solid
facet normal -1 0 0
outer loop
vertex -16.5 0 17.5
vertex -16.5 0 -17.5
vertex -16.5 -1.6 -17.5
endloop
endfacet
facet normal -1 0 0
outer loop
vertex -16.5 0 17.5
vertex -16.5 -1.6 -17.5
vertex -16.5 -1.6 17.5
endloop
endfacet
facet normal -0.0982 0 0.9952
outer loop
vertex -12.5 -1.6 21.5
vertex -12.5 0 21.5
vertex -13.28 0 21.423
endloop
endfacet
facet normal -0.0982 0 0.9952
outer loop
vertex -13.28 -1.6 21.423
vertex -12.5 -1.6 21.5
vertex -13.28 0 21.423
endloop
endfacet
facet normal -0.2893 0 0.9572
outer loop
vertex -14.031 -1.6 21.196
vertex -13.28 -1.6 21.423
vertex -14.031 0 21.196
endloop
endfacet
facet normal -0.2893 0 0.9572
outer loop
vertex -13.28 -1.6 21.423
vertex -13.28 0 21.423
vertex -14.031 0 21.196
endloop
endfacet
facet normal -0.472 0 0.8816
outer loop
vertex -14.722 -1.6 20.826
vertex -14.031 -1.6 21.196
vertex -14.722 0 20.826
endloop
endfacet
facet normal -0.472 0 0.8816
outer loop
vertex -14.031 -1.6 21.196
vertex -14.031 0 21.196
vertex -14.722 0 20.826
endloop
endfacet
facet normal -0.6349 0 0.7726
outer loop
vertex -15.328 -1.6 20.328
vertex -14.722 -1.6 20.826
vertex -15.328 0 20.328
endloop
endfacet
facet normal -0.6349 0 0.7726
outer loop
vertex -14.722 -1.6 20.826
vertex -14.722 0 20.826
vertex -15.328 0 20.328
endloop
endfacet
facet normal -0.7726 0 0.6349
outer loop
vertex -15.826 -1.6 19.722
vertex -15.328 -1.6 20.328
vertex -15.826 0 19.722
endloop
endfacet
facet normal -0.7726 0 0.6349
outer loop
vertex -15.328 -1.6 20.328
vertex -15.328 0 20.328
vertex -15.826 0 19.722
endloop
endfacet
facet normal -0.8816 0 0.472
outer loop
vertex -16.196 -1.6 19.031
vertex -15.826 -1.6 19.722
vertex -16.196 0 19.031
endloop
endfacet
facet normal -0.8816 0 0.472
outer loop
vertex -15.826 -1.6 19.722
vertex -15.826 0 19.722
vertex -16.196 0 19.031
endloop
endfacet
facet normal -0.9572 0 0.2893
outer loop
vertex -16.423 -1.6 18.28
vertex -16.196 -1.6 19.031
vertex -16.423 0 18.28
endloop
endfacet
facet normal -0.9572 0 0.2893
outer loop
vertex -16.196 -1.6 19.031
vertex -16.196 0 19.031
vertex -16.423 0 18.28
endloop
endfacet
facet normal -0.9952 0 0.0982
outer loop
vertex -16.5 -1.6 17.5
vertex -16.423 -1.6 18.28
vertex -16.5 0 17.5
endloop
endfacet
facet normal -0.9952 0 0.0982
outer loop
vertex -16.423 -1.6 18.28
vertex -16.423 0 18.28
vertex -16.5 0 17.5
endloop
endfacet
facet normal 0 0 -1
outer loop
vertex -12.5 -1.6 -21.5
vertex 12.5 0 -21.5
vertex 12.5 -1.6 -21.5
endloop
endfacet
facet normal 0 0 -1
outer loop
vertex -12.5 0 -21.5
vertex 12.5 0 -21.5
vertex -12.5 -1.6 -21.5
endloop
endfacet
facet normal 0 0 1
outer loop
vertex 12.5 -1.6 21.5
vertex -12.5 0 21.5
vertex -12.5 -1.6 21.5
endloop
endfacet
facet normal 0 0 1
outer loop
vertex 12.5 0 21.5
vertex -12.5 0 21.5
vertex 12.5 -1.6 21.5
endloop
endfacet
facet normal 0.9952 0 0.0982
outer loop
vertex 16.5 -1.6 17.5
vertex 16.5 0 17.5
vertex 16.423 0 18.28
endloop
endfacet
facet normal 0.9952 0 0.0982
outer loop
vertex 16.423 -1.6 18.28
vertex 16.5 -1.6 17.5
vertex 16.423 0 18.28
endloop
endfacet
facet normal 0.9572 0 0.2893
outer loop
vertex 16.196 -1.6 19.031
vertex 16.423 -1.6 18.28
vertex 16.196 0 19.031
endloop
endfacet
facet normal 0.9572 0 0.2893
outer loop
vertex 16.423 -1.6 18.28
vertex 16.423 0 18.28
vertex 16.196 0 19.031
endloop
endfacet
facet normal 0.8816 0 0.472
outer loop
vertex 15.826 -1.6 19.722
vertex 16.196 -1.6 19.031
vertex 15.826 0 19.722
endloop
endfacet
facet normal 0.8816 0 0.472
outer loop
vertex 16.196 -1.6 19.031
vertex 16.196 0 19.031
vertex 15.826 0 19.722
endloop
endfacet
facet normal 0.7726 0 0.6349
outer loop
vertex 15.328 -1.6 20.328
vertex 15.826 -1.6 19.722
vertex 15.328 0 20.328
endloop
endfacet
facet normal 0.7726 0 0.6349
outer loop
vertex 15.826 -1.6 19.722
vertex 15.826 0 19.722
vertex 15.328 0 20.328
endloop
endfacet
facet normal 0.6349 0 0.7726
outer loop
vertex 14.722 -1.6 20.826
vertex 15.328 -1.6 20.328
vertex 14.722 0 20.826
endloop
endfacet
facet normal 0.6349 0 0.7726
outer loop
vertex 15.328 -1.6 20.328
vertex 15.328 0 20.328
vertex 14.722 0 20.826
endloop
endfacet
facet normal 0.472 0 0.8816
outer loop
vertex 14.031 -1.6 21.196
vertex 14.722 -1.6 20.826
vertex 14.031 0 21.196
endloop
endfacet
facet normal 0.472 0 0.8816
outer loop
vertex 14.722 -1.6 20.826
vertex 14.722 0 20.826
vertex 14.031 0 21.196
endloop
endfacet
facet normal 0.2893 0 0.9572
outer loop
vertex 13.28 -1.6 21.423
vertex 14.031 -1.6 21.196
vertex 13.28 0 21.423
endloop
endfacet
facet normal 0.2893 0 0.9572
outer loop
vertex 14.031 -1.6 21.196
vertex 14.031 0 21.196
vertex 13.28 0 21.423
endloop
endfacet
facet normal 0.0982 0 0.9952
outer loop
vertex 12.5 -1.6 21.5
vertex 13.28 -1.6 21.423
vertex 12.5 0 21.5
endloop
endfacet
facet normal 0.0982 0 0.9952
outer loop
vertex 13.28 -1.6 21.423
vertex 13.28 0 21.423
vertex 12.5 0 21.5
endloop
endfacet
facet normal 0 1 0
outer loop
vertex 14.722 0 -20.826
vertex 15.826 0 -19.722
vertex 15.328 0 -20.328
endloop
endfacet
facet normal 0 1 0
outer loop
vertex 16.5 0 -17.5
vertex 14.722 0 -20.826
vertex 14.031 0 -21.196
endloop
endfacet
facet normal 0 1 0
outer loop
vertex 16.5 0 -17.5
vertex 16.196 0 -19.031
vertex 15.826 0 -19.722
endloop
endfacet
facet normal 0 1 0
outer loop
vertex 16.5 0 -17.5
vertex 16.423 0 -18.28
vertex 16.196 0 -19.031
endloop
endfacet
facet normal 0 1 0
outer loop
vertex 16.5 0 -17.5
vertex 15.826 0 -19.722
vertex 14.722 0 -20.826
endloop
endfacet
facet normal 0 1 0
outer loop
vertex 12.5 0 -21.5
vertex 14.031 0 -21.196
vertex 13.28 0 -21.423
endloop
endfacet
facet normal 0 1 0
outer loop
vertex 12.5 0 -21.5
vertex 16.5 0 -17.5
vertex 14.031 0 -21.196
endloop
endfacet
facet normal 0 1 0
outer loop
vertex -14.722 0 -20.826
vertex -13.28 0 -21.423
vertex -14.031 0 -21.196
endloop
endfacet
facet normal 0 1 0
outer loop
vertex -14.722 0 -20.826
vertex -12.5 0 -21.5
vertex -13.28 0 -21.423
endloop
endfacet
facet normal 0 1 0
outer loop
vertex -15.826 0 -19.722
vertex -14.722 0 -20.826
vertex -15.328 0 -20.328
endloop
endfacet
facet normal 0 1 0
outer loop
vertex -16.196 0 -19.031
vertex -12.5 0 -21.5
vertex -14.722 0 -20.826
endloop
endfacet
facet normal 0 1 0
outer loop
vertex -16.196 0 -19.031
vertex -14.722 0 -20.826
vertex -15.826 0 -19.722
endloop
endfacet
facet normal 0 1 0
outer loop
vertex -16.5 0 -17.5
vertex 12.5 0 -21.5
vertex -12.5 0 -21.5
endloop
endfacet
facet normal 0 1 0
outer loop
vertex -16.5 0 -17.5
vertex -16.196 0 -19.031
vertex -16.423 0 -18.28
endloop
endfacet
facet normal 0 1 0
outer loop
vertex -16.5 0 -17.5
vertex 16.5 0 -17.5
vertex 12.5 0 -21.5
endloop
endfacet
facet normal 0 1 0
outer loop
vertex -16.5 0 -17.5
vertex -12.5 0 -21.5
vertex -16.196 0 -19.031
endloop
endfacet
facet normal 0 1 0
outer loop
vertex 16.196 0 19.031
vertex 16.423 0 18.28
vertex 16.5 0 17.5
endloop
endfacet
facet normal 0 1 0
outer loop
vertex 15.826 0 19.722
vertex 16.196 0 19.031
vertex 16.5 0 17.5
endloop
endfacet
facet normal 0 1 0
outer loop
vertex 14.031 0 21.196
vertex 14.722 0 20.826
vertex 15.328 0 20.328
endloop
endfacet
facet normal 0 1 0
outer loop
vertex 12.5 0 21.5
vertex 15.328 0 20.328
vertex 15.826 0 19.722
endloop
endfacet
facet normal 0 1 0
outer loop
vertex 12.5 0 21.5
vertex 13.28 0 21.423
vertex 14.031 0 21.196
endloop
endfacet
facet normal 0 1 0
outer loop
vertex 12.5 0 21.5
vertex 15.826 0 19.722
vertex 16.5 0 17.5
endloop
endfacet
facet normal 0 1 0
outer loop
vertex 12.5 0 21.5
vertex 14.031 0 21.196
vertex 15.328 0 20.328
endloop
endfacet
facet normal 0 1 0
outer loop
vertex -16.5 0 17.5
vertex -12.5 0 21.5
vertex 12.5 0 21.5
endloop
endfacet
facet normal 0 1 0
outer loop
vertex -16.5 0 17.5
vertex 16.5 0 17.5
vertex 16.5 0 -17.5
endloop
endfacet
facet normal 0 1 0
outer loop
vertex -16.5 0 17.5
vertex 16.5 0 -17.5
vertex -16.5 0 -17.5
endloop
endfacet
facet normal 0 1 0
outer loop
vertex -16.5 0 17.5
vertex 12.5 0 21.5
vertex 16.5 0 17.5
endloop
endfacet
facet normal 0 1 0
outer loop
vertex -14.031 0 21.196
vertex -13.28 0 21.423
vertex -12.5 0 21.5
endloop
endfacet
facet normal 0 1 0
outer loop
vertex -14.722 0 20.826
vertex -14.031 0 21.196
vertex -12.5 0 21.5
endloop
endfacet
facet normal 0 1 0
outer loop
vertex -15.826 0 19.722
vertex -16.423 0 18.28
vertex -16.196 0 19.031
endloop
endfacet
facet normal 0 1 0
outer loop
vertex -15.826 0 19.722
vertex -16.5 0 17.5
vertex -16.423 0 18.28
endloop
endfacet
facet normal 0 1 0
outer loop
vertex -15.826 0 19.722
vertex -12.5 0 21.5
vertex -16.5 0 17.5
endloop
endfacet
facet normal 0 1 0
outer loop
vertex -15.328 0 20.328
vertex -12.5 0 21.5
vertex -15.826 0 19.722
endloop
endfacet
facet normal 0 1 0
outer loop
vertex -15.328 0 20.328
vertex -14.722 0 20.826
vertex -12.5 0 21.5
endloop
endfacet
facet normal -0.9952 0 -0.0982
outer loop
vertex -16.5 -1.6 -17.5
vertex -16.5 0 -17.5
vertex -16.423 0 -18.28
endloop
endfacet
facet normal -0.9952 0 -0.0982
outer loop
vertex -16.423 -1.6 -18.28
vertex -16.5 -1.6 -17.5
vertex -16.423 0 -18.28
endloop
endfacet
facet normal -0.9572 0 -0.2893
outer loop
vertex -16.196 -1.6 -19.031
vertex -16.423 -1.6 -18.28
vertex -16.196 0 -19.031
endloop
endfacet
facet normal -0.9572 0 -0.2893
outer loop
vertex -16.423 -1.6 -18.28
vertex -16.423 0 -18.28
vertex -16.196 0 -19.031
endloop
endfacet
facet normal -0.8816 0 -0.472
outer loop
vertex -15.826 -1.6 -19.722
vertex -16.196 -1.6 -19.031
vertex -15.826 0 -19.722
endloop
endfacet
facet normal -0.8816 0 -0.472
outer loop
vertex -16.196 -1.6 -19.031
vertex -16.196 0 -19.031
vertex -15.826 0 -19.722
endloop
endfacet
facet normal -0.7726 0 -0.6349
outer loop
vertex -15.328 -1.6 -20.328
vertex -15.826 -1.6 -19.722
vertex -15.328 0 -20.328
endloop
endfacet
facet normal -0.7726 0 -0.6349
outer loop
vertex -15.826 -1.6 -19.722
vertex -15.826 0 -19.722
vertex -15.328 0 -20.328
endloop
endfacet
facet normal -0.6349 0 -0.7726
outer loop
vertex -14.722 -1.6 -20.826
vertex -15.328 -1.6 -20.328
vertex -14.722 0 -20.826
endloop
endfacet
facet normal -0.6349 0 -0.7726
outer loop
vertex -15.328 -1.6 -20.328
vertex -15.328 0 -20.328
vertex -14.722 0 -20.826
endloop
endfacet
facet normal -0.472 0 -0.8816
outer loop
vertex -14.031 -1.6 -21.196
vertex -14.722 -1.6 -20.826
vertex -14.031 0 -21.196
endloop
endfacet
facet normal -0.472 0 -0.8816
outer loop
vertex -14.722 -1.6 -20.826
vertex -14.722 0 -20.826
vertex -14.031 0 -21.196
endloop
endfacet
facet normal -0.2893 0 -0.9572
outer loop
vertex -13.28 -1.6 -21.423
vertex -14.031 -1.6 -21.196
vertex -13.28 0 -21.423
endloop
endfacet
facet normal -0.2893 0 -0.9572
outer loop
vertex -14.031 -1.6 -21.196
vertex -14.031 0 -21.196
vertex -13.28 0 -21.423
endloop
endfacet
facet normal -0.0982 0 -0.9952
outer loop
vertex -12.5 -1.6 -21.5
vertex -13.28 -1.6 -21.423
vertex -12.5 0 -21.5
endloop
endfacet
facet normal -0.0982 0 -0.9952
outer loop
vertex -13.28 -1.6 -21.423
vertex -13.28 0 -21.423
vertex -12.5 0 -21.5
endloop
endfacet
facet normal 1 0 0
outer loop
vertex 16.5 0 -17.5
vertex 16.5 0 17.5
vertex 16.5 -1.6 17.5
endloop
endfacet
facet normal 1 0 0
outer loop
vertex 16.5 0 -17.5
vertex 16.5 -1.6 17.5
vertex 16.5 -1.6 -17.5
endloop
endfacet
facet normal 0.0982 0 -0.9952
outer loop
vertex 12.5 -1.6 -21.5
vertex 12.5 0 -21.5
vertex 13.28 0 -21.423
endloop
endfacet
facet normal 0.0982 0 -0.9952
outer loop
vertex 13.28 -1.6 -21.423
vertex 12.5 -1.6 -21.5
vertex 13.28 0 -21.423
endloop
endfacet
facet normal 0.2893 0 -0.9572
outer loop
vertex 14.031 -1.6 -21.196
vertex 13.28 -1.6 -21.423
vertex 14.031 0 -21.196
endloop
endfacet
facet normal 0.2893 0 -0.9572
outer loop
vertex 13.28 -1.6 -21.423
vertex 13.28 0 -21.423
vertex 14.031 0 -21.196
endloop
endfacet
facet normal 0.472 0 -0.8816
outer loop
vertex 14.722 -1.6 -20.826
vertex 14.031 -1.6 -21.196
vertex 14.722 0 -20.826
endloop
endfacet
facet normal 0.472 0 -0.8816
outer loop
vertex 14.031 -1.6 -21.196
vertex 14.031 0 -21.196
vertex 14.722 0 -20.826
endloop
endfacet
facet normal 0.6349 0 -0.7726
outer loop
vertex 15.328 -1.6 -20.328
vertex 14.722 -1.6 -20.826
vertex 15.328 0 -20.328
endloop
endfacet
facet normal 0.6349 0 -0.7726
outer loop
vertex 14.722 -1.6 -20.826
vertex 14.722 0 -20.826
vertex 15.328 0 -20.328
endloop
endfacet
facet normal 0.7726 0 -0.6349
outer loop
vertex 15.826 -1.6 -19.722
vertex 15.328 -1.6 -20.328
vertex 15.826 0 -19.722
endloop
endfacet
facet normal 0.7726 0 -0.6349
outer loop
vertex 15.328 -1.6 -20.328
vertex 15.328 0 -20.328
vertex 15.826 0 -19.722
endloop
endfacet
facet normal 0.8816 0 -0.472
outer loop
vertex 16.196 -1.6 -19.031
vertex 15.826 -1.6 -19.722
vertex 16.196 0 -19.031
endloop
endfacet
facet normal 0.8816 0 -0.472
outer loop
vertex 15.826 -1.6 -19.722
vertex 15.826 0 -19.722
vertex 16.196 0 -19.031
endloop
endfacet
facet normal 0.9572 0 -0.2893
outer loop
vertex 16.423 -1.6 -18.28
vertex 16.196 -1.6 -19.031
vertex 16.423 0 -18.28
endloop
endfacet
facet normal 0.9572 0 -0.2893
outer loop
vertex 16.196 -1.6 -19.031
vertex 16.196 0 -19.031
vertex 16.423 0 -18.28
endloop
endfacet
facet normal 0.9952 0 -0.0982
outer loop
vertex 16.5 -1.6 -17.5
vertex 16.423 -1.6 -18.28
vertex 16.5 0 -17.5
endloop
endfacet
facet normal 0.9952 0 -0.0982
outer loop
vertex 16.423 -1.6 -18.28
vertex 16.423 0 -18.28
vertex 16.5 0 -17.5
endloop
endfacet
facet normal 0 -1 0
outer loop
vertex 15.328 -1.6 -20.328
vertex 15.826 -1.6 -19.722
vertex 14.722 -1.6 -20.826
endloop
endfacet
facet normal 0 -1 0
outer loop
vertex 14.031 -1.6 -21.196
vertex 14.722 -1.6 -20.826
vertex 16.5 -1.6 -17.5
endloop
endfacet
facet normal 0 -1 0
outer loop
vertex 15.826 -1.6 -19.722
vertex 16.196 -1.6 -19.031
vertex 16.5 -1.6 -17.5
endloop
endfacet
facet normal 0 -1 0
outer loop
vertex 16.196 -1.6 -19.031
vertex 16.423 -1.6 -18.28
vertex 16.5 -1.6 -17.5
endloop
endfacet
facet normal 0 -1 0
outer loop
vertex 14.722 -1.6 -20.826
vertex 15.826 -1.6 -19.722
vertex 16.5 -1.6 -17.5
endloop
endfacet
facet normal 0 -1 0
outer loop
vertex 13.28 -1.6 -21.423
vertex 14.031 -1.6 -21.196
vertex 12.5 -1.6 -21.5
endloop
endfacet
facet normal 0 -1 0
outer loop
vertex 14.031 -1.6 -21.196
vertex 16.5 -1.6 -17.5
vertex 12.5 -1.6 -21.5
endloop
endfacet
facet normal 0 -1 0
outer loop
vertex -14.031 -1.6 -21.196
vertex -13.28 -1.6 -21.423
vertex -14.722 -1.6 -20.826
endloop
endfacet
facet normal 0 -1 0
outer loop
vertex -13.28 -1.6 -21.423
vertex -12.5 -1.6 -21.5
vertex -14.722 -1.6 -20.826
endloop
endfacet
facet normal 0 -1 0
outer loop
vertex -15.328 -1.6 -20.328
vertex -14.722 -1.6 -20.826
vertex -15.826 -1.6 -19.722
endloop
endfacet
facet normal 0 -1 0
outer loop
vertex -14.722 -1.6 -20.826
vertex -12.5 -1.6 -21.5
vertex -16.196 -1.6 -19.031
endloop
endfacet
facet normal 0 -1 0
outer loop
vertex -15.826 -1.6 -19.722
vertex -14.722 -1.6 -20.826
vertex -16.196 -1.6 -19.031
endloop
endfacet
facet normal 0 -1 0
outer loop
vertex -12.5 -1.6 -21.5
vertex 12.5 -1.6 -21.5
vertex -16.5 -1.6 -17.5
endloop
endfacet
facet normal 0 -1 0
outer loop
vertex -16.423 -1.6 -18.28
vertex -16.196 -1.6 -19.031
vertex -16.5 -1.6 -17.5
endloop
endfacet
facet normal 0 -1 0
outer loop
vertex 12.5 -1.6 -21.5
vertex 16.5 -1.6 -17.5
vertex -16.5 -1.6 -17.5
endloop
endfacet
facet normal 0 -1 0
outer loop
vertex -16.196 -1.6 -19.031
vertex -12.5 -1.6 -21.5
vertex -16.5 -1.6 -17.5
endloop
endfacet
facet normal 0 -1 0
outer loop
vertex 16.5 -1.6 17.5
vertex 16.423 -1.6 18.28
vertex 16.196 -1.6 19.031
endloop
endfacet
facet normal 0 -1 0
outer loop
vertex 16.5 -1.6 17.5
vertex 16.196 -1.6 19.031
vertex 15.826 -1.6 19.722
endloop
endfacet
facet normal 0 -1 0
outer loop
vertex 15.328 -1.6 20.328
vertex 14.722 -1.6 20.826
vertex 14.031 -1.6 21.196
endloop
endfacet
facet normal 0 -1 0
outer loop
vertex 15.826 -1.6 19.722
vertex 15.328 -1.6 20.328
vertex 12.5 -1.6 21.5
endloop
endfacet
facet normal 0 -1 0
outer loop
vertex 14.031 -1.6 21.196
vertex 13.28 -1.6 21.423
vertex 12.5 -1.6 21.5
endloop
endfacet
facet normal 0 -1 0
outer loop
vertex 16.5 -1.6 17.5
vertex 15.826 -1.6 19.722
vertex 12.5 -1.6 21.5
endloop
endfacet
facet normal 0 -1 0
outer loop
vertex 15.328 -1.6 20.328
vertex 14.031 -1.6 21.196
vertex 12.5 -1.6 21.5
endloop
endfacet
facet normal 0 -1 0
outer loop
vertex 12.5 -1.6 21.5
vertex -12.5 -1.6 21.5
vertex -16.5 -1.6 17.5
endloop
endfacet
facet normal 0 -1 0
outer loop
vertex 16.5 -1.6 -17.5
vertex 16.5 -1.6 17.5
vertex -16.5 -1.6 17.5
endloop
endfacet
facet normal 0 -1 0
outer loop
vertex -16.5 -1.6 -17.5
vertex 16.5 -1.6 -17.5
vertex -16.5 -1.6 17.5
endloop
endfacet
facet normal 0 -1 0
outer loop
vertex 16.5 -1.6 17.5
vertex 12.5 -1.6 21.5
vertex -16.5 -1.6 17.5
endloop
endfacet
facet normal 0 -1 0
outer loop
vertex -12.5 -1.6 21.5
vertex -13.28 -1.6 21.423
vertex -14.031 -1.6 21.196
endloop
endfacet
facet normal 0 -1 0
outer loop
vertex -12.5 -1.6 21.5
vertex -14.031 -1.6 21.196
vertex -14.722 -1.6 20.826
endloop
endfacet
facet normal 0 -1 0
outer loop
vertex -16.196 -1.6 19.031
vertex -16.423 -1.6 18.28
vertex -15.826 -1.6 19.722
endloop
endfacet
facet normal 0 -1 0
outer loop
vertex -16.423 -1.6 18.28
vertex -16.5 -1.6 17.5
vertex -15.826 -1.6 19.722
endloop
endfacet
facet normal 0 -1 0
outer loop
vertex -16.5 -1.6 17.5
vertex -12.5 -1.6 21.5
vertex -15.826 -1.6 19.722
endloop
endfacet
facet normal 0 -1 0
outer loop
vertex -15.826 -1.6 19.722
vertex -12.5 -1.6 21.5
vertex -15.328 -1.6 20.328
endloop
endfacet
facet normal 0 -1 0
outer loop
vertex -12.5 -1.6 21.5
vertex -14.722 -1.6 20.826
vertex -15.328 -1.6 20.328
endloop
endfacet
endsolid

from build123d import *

# Parameters (mm, degrees)
PAD_DEPTH = 1.6


with BuildPart() as part:
    # Sketch → Pad (new body)
    with BuildSketch(Plane.XZ):
        with BuildLine():
            Line((-12.5, 21.5), (12.5, 21.5))
            ThreePointArc((16.5, 17.5), (15.328427, 20.328427), (12.5, 21.5))
            Line((16.5, 17.5), (16.5, -17.5))
            ThreePointArc((12.5, -21.5), (15.328427, -20.328427), (16.5, -17.5))
            Line((12.5, -21.5), (-12.5, -21.5))
            ThreePointArc((-16.5, -17.5), (-15.328427, -20.328427), (-12.5, -21.5))
            Line((-16.5, -17.5), (-16.5, 17.5))
            ThreePointArc((-12.5, 21.5), (-15.328427, 20.328427), (-16.5, 17.5))
        make_face()
    extrude(amount=PAD_DEPTH)


solid = part.part
